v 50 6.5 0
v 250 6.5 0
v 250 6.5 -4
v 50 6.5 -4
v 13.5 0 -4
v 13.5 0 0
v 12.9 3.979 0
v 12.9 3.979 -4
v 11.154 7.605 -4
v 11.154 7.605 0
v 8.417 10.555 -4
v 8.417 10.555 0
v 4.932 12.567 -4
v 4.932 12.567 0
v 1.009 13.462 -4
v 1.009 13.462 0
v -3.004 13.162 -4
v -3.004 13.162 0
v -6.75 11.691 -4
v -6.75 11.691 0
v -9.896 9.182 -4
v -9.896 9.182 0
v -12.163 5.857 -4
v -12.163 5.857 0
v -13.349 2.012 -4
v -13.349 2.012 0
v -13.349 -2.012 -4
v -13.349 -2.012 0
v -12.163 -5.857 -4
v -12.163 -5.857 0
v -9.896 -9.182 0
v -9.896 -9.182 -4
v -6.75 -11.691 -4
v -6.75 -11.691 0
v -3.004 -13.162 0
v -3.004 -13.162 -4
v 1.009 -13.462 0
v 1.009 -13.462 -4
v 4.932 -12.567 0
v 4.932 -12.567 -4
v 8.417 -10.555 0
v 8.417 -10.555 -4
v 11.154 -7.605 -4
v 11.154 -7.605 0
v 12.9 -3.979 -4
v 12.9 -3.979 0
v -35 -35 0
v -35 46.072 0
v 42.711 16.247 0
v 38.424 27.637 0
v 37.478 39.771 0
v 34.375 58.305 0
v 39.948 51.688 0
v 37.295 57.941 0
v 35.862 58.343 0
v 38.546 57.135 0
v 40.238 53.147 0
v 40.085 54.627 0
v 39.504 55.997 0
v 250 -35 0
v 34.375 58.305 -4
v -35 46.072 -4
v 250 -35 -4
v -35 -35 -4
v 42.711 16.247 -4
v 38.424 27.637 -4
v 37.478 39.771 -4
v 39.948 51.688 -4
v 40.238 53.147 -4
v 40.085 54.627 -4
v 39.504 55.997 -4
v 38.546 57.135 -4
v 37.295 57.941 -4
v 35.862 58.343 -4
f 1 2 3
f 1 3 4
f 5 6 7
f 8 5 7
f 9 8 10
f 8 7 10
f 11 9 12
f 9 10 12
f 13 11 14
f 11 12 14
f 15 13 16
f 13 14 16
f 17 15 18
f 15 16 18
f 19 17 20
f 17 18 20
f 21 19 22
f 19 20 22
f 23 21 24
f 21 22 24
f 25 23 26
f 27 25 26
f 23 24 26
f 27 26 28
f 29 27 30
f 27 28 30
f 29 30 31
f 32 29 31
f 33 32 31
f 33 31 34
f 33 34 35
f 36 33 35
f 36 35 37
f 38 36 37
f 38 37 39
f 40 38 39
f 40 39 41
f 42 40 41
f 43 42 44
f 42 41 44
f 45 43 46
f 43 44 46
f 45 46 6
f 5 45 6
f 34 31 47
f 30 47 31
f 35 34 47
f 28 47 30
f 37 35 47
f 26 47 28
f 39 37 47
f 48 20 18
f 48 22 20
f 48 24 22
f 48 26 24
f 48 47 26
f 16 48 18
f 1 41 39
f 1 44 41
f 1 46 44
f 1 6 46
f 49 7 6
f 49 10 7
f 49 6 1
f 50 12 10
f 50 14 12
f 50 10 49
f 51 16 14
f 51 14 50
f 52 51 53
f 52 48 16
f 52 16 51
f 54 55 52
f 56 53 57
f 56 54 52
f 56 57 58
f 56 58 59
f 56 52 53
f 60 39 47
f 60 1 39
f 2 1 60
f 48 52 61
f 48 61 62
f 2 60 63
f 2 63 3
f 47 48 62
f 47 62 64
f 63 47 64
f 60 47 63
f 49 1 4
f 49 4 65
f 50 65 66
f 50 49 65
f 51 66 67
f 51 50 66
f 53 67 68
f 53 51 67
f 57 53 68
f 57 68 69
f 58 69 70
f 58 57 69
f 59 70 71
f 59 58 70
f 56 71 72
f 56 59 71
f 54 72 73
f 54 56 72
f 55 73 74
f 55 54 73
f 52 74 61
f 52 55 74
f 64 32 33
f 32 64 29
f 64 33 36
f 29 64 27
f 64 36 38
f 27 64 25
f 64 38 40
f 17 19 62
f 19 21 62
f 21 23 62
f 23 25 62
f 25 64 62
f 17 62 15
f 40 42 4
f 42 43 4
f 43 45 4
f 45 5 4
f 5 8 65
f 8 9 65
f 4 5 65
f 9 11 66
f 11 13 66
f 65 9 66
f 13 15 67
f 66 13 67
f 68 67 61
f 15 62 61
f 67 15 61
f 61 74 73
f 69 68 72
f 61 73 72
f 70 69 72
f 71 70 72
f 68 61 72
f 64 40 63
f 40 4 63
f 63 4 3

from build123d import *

# Parameters (mm, degrees)
SKETCH_1_R             = 13.5
SM_BASE_FLANGE_1_DEPTH = 4


# Sheet-metal steps are written as plain solids
with BuildPart() as part:
    # Sketch 1 → Базовая кромка1 (new body)
    with BuildSketch(Plane.XY):
        with BuildLine():
            Line((0, -35), (250, -35))
            Line((250, -35), (250, 6.5))
            Line((250, 6.5), (50, 6.5))
            ThreePointArc((50, 6.5), (38.424329978, 27.637073819), (39.947947324, 51.688074136))
            ThreePointArc((39.947947324, 51.688074136), (39.067621468, 56.60193476), (34.375031444, 58.305049172))
            Line((34.375031444, 58.305049172), (-35, 46.072359341))
            Line((-35, 46.072359341), (-35, -35))
            Line((-35, -35), (0, -35))
        make_face()
        Circle(SKETCH_1_R, mode=Mode.SUBTRACT)
    extrude(amount=-SM_BASE_FLANGE_1_DEPTH)


solid = part.part
